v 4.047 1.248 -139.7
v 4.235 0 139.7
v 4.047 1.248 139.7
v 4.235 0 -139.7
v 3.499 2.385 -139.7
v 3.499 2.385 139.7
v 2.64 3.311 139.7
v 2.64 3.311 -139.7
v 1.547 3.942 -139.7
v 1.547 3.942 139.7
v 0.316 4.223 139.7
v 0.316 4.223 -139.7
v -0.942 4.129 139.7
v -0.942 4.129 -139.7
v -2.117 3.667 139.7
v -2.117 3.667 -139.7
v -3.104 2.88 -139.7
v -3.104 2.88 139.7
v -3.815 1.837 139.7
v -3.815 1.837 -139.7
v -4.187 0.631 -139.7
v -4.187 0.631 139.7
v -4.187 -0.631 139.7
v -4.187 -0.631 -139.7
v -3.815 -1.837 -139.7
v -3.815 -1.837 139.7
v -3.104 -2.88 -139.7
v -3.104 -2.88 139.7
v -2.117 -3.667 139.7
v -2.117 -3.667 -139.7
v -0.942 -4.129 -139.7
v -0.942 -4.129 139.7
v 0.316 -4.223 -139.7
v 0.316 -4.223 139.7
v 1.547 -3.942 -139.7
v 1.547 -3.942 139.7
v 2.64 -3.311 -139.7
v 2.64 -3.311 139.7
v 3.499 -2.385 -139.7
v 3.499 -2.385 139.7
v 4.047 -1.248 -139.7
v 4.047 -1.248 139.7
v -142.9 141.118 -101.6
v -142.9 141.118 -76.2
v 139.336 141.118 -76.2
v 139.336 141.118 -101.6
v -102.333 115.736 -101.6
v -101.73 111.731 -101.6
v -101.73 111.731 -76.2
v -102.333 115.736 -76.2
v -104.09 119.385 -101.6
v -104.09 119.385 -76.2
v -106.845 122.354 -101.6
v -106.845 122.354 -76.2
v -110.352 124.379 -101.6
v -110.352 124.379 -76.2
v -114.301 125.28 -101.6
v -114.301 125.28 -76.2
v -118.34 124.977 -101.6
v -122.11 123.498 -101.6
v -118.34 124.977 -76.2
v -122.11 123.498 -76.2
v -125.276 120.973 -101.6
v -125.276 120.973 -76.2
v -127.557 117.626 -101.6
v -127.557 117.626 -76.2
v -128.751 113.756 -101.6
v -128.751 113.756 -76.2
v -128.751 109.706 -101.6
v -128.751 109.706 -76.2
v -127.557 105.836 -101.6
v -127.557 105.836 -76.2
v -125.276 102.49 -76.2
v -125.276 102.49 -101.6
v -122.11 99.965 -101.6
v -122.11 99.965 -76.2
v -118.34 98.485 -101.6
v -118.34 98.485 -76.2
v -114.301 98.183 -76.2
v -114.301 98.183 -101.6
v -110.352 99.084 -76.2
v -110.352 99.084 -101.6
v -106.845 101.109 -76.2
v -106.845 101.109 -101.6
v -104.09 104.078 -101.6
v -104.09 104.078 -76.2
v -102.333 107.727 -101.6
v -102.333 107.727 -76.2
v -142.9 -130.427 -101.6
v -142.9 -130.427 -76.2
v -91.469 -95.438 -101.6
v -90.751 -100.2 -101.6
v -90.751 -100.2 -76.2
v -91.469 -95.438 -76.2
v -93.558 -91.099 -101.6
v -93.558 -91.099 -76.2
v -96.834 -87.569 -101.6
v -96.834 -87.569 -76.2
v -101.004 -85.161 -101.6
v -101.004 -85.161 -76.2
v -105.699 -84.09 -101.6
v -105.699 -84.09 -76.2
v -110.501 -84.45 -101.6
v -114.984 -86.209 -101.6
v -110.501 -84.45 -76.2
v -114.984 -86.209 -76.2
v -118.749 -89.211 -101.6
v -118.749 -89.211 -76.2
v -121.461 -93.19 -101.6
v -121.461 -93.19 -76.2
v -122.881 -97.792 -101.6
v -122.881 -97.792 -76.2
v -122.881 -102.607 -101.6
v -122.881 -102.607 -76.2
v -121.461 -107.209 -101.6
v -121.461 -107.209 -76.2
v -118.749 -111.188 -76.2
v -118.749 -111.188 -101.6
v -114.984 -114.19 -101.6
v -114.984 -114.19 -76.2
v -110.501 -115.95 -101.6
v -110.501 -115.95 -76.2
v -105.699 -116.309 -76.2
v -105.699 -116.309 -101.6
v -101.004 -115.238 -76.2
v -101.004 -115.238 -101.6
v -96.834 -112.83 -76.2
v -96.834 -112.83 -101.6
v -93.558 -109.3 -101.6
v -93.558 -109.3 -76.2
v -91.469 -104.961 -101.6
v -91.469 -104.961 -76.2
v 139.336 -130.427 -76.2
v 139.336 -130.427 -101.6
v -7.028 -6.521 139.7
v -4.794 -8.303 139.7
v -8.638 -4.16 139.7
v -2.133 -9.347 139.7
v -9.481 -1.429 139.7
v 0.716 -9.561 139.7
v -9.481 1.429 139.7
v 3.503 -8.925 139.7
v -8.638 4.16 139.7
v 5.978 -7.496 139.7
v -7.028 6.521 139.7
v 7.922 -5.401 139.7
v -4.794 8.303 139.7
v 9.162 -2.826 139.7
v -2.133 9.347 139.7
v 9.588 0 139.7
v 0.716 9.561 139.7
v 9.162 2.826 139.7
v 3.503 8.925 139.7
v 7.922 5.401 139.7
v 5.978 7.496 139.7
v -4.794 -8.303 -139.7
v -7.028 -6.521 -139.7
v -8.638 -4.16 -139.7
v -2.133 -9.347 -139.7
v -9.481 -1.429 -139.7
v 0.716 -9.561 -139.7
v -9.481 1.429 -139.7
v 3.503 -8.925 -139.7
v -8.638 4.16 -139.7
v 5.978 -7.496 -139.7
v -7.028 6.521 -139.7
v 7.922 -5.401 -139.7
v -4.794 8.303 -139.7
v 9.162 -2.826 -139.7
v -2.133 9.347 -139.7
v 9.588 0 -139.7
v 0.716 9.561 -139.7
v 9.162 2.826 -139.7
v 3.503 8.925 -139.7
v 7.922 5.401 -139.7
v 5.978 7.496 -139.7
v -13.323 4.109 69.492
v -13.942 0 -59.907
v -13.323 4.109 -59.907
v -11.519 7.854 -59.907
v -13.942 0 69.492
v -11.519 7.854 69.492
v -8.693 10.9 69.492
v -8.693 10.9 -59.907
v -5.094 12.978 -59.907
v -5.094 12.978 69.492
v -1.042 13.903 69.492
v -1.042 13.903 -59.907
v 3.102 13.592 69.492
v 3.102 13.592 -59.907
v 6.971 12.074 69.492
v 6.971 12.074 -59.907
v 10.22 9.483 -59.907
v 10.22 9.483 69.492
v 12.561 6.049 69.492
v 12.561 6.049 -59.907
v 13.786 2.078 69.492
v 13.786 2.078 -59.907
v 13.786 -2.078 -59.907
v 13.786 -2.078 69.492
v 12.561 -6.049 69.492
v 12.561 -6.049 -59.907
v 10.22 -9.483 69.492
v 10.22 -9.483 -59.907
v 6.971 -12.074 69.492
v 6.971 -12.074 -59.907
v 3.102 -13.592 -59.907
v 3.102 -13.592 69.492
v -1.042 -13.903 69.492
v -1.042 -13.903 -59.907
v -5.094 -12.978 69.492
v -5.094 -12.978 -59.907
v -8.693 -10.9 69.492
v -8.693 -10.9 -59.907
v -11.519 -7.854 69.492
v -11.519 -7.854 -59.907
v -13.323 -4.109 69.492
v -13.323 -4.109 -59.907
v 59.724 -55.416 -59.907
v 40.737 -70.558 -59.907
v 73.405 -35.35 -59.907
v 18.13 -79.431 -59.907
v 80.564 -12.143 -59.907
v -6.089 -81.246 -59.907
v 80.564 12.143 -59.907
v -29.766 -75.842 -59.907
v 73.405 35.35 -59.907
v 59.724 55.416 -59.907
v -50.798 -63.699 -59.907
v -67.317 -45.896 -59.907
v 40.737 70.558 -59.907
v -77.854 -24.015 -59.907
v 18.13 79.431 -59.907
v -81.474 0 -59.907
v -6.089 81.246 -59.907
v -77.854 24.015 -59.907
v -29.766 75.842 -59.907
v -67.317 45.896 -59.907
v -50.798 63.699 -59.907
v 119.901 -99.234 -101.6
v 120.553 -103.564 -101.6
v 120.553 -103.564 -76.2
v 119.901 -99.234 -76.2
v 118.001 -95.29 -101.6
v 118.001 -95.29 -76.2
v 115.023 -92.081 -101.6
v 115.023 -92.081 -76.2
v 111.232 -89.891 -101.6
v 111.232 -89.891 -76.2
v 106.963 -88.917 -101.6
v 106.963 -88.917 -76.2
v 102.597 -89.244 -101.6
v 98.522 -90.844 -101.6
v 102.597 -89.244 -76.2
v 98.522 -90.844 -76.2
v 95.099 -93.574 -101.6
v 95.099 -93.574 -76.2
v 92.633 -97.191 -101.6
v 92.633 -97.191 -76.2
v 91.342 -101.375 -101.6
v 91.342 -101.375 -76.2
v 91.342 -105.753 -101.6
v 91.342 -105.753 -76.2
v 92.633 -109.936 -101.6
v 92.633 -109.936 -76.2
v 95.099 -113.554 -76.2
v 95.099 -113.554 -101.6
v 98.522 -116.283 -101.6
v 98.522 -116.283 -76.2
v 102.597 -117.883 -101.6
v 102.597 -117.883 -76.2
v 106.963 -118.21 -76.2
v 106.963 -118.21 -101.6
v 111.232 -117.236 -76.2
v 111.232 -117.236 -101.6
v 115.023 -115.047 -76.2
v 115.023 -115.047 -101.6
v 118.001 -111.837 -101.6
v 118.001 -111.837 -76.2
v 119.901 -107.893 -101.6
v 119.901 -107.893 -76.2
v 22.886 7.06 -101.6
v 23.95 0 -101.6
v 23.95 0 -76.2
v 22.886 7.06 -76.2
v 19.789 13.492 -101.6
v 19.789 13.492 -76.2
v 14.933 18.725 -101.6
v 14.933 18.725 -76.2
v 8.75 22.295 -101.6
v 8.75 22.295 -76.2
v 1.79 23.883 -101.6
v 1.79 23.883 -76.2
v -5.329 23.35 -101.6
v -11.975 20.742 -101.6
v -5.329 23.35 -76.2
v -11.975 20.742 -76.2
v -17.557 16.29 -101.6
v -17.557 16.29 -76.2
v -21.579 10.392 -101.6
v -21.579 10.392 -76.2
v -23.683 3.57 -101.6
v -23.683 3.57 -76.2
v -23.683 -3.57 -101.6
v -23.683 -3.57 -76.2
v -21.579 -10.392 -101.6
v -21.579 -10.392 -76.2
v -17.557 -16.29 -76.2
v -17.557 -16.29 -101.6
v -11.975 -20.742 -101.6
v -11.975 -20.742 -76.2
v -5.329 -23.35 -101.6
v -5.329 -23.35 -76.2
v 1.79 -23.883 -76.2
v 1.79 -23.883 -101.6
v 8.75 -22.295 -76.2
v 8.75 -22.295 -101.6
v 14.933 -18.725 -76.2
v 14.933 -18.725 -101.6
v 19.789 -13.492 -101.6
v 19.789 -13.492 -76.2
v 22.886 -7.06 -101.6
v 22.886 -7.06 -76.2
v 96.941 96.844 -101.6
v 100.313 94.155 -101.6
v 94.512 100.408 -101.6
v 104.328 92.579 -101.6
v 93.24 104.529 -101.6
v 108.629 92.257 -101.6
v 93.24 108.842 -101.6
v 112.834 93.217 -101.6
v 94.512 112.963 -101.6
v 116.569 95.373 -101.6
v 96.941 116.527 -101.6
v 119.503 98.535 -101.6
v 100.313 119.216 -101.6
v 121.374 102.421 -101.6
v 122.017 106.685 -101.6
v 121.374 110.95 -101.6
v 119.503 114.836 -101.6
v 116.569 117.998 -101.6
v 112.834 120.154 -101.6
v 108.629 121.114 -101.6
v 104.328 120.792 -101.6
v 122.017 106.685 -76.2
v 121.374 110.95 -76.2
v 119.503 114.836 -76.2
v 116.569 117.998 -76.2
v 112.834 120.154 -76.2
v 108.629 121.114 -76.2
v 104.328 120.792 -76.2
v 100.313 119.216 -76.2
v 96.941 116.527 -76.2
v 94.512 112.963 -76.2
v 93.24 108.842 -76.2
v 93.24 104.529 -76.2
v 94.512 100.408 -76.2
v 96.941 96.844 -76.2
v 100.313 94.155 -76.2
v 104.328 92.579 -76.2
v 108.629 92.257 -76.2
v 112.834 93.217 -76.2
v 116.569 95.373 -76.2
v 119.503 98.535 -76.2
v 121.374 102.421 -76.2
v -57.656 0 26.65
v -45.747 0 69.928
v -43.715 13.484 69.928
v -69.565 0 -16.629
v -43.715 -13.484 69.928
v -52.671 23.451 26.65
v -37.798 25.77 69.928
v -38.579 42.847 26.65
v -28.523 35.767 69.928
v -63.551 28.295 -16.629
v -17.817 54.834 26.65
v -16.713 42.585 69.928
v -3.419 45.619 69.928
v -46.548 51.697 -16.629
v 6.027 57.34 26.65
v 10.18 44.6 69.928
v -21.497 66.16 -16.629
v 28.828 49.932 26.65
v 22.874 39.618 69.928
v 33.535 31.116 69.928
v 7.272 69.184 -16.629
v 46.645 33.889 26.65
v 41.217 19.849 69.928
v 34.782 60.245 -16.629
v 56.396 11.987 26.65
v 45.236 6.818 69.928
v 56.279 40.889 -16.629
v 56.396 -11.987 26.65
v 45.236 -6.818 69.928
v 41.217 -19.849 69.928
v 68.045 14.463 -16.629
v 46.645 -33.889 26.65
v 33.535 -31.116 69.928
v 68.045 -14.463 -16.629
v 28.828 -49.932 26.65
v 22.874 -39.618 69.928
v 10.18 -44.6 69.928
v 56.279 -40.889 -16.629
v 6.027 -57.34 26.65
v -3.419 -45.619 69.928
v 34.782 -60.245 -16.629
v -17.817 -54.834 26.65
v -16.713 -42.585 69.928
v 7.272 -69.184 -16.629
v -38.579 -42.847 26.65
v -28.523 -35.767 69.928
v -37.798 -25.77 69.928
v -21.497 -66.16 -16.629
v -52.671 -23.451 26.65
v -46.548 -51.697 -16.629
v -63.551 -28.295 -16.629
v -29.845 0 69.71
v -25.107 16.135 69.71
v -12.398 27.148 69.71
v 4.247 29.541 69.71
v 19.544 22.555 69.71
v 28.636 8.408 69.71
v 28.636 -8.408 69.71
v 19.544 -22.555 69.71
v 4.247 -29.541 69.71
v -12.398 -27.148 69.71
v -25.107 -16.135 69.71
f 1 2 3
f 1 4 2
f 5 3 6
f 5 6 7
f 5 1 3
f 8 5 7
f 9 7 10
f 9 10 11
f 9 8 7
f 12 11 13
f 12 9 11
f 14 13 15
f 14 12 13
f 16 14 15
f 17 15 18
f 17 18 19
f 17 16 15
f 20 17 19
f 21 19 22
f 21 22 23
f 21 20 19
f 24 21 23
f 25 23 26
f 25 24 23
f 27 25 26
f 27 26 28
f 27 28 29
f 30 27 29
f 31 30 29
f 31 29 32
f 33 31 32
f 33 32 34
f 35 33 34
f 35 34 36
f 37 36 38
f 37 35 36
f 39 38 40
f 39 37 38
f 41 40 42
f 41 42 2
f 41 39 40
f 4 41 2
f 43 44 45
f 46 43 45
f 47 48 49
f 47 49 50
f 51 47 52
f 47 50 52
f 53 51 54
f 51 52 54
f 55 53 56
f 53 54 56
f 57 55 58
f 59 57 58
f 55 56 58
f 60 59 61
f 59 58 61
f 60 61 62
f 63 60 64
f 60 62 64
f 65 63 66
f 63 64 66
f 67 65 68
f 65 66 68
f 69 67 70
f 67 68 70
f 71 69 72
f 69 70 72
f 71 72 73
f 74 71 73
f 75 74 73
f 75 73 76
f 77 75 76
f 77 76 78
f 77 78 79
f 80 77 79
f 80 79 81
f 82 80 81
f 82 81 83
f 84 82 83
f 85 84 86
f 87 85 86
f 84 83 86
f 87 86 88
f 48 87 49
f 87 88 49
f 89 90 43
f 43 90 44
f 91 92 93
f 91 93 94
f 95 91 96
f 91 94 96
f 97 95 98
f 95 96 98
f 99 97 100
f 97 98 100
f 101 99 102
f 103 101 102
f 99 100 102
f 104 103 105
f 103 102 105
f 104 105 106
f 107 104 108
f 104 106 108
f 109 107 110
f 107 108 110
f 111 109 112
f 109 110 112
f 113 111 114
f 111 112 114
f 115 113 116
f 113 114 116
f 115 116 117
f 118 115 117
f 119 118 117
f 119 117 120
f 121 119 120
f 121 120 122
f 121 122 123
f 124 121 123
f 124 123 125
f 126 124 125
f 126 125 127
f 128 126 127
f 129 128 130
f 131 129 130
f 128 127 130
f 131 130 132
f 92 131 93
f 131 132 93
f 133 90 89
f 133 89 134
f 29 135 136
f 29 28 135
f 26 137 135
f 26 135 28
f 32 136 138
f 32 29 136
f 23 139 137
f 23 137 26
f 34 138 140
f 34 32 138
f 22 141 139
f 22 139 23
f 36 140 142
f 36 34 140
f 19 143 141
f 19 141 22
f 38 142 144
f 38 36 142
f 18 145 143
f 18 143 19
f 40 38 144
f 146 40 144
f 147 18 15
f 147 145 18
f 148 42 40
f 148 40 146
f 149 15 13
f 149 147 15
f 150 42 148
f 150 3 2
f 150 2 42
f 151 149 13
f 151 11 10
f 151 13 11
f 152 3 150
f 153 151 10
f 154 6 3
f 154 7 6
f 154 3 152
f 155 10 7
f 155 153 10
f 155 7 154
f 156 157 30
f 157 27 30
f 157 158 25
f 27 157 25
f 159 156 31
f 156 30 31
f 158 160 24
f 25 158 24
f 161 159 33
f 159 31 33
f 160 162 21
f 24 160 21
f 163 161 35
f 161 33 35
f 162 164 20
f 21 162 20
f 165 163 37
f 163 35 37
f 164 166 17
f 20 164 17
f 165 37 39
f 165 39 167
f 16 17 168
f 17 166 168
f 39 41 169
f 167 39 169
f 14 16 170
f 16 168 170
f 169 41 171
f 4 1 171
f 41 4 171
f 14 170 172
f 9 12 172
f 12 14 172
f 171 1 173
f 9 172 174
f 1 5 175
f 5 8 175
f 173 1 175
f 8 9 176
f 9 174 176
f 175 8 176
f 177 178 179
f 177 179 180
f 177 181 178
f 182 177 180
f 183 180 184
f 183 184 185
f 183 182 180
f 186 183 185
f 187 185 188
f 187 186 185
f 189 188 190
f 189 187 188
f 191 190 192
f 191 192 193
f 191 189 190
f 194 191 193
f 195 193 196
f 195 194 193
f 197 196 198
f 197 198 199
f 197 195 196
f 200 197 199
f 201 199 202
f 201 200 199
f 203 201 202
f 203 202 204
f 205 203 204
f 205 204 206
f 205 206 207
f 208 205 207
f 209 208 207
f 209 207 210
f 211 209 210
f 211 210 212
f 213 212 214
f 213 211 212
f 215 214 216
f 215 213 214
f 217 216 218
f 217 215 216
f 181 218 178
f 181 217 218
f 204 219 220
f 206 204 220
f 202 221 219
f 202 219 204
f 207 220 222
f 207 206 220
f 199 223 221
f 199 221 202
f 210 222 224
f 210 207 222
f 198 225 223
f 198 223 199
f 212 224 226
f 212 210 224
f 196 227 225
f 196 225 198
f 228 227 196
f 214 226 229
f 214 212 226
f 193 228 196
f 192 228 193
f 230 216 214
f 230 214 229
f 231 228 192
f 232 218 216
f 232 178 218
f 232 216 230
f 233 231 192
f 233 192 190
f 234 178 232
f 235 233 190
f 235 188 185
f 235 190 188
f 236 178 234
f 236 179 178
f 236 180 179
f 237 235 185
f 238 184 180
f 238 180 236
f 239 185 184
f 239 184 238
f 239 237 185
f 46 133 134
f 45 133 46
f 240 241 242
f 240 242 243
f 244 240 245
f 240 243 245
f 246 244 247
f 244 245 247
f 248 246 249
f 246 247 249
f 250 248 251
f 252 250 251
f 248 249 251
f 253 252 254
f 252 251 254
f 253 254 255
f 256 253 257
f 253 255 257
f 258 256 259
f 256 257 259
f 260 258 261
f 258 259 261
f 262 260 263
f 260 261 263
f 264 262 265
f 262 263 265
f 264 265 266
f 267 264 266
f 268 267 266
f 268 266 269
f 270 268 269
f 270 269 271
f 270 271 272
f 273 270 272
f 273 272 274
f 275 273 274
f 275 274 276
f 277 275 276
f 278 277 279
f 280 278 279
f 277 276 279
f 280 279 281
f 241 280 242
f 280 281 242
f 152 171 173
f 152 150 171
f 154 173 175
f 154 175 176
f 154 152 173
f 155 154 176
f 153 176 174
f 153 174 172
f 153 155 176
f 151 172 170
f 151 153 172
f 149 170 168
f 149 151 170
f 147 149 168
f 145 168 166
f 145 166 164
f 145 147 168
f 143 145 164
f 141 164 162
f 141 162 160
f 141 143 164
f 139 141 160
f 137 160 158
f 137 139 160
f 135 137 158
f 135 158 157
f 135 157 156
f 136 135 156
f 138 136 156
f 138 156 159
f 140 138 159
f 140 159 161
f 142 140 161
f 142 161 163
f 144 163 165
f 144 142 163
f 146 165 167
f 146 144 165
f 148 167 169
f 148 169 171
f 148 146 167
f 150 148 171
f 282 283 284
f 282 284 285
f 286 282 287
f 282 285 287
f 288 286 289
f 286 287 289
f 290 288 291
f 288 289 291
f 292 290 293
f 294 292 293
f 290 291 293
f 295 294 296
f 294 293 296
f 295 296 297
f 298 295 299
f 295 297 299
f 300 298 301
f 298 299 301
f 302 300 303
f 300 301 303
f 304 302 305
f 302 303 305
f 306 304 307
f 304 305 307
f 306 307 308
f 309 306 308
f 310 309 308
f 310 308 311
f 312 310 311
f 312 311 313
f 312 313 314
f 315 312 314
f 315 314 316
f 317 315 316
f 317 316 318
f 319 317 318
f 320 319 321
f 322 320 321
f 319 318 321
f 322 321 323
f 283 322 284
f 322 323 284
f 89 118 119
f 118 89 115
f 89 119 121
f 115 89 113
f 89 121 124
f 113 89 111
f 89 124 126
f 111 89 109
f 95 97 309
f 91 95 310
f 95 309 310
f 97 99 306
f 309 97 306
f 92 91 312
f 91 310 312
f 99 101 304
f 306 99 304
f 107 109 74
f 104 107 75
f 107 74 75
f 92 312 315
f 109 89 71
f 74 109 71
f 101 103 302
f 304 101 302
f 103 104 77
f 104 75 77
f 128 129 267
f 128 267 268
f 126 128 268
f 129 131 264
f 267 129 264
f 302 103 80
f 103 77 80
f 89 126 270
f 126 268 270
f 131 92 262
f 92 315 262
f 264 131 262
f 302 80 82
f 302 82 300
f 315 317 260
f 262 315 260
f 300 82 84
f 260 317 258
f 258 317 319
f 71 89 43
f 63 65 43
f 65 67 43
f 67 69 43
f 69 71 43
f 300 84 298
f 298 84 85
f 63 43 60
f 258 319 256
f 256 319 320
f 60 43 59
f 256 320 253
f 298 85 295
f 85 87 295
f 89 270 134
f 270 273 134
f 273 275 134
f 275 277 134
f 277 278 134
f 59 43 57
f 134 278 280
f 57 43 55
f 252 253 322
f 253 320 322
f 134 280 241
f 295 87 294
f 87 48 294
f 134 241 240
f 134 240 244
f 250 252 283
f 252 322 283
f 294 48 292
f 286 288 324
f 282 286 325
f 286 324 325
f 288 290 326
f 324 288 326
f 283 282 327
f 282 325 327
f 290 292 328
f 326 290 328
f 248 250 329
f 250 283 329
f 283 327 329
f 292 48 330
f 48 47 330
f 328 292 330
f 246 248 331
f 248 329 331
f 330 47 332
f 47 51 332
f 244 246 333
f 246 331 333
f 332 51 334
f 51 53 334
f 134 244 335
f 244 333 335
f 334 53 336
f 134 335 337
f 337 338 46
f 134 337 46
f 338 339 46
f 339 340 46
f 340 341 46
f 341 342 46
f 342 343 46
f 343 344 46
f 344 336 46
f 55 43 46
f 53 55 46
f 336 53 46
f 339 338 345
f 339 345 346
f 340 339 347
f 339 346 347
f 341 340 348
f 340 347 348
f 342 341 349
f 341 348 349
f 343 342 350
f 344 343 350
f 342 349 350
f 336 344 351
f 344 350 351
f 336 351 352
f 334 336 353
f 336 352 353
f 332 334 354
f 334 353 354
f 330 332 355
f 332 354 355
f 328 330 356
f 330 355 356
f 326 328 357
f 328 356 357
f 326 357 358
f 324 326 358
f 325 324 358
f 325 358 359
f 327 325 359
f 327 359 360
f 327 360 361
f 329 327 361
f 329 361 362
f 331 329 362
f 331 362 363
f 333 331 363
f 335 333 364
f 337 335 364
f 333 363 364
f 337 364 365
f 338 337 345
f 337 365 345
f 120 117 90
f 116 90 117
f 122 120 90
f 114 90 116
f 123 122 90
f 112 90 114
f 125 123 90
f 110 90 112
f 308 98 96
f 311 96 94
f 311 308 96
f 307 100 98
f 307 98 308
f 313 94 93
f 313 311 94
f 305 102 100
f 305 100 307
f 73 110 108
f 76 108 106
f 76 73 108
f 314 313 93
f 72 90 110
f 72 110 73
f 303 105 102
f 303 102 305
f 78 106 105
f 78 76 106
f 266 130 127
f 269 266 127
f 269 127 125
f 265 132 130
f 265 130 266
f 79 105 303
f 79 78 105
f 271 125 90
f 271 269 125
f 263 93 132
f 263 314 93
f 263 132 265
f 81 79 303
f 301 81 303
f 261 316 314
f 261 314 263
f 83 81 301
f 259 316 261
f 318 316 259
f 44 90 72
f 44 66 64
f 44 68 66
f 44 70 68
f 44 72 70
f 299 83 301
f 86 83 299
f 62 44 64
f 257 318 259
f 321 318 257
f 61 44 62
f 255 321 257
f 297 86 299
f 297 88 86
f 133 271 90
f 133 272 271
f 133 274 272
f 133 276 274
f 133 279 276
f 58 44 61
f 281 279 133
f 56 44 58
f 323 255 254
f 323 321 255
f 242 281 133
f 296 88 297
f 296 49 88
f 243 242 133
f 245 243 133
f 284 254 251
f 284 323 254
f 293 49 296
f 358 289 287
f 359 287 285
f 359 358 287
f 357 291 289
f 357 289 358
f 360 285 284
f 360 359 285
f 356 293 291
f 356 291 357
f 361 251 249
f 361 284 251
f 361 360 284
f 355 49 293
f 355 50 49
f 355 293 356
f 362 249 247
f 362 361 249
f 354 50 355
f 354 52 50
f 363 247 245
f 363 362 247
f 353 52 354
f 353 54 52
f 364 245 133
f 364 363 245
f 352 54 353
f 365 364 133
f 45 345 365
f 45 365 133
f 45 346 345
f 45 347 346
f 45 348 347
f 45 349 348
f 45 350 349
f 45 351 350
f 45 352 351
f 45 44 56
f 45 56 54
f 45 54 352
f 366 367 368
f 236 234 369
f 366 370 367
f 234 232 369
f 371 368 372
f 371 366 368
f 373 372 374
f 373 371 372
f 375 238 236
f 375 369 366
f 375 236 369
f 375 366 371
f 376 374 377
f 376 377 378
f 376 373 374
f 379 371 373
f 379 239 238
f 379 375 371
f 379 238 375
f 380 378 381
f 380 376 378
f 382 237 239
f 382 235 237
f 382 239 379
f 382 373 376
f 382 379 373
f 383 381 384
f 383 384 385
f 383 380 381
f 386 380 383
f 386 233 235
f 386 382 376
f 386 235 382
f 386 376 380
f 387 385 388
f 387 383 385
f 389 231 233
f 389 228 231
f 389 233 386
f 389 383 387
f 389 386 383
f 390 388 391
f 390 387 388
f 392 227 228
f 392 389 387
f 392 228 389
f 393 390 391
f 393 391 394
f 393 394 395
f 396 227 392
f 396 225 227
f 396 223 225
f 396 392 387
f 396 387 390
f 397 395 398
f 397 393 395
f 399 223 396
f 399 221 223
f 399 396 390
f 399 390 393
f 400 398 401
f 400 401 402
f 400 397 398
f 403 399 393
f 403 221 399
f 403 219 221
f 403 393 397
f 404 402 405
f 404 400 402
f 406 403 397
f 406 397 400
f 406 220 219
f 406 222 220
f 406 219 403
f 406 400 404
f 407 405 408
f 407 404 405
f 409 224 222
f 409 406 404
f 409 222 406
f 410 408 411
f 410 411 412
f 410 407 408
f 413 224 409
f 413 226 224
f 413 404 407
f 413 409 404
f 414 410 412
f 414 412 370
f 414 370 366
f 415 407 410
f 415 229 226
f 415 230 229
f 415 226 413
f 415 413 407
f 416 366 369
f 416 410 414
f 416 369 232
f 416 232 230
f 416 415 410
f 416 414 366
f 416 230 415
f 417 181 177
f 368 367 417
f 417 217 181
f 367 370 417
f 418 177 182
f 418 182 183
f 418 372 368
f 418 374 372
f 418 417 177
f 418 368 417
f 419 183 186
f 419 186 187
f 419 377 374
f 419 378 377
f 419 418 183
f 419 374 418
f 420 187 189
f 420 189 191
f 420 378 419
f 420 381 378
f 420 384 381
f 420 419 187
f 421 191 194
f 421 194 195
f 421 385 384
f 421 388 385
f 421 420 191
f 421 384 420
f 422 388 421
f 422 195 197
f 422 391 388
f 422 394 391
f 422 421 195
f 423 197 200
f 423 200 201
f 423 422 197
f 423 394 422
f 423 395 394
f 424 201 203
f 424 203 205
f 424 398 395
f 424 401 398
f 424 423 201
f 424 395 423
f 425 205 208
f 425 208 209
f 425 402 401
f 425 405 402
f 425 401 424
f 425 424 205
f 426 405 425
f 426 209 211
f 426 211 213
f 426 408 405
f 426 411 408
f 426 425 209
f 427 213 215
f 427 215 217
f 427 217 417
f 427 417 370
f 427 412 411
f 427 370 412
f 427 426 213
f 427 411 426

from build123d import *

# Parameters (mm, degrees)
F2_R     = 9.587678
F2_R_2   = 4.234703
F3_DEPTH = 139.7
F5_W     = 282.236397
F5_H     = 271.545619
F5_R     = 16.155004
F5_R_2   = 14.687376
F5_R_3   = 23.950401
F5_R_4   = 13.586701
F5_R_5   = 14.469037
F6_DEPTH = 25.4


with BuildPart() as f1:
    # F0 (on Front) → F1 (revolve)
    with BuildSketch(Plane.XZ):
        Polygon((-13.942028, 69.49234), (-45.747302, 69.928028), (-81.473768, -59.907191), (-13.942028, -59.907191), align=None)
    revolve(axis=Axis((0, 0, 7.188862), (0, 0, -1)))


with BuildPart() as f3:
    # F2 (on Top) → F3 (new body, symmetric)
    with BuildSketch(Plane.XY):
        Circle(F2_R)
        Circle(F2_R_2, mode=Mode.SUBTRACT)
    extrude(amount=F3_DEPTH, both=True)


with BuildPart() as f6:
    # F5 (on offset) → F6 (new body)
    with BuildSketch(Plane.XY.offset(-76.2)):
        with Locations((-1.781792, 5.34539)):
            Rectangle(F5_W, F5_H)
        with Locations((-106.906265, -100.19958)):
            Circle(F5_R, mode=Mode.SUBTRACT)
        with Locations((105.86568, -103.563562)):
            Circle(F5_R_2, mode=Mode.SUBTRACT)
        Circle(F5_R_3, mode=Mode.SUBTRACT)
        with Locations((-115.316227, 111.731365)):
            Circle(F5_R_4, mode=Mode.SUBTRACT)
        with Locations((107.547671, 106.685393)):
            Circle(F5_R_5, mode=Mode.SUBTRACT)
    extrude(amount=-F6_DEPTH)


solid = Compound([f1.part, f3.part, f6.part])
